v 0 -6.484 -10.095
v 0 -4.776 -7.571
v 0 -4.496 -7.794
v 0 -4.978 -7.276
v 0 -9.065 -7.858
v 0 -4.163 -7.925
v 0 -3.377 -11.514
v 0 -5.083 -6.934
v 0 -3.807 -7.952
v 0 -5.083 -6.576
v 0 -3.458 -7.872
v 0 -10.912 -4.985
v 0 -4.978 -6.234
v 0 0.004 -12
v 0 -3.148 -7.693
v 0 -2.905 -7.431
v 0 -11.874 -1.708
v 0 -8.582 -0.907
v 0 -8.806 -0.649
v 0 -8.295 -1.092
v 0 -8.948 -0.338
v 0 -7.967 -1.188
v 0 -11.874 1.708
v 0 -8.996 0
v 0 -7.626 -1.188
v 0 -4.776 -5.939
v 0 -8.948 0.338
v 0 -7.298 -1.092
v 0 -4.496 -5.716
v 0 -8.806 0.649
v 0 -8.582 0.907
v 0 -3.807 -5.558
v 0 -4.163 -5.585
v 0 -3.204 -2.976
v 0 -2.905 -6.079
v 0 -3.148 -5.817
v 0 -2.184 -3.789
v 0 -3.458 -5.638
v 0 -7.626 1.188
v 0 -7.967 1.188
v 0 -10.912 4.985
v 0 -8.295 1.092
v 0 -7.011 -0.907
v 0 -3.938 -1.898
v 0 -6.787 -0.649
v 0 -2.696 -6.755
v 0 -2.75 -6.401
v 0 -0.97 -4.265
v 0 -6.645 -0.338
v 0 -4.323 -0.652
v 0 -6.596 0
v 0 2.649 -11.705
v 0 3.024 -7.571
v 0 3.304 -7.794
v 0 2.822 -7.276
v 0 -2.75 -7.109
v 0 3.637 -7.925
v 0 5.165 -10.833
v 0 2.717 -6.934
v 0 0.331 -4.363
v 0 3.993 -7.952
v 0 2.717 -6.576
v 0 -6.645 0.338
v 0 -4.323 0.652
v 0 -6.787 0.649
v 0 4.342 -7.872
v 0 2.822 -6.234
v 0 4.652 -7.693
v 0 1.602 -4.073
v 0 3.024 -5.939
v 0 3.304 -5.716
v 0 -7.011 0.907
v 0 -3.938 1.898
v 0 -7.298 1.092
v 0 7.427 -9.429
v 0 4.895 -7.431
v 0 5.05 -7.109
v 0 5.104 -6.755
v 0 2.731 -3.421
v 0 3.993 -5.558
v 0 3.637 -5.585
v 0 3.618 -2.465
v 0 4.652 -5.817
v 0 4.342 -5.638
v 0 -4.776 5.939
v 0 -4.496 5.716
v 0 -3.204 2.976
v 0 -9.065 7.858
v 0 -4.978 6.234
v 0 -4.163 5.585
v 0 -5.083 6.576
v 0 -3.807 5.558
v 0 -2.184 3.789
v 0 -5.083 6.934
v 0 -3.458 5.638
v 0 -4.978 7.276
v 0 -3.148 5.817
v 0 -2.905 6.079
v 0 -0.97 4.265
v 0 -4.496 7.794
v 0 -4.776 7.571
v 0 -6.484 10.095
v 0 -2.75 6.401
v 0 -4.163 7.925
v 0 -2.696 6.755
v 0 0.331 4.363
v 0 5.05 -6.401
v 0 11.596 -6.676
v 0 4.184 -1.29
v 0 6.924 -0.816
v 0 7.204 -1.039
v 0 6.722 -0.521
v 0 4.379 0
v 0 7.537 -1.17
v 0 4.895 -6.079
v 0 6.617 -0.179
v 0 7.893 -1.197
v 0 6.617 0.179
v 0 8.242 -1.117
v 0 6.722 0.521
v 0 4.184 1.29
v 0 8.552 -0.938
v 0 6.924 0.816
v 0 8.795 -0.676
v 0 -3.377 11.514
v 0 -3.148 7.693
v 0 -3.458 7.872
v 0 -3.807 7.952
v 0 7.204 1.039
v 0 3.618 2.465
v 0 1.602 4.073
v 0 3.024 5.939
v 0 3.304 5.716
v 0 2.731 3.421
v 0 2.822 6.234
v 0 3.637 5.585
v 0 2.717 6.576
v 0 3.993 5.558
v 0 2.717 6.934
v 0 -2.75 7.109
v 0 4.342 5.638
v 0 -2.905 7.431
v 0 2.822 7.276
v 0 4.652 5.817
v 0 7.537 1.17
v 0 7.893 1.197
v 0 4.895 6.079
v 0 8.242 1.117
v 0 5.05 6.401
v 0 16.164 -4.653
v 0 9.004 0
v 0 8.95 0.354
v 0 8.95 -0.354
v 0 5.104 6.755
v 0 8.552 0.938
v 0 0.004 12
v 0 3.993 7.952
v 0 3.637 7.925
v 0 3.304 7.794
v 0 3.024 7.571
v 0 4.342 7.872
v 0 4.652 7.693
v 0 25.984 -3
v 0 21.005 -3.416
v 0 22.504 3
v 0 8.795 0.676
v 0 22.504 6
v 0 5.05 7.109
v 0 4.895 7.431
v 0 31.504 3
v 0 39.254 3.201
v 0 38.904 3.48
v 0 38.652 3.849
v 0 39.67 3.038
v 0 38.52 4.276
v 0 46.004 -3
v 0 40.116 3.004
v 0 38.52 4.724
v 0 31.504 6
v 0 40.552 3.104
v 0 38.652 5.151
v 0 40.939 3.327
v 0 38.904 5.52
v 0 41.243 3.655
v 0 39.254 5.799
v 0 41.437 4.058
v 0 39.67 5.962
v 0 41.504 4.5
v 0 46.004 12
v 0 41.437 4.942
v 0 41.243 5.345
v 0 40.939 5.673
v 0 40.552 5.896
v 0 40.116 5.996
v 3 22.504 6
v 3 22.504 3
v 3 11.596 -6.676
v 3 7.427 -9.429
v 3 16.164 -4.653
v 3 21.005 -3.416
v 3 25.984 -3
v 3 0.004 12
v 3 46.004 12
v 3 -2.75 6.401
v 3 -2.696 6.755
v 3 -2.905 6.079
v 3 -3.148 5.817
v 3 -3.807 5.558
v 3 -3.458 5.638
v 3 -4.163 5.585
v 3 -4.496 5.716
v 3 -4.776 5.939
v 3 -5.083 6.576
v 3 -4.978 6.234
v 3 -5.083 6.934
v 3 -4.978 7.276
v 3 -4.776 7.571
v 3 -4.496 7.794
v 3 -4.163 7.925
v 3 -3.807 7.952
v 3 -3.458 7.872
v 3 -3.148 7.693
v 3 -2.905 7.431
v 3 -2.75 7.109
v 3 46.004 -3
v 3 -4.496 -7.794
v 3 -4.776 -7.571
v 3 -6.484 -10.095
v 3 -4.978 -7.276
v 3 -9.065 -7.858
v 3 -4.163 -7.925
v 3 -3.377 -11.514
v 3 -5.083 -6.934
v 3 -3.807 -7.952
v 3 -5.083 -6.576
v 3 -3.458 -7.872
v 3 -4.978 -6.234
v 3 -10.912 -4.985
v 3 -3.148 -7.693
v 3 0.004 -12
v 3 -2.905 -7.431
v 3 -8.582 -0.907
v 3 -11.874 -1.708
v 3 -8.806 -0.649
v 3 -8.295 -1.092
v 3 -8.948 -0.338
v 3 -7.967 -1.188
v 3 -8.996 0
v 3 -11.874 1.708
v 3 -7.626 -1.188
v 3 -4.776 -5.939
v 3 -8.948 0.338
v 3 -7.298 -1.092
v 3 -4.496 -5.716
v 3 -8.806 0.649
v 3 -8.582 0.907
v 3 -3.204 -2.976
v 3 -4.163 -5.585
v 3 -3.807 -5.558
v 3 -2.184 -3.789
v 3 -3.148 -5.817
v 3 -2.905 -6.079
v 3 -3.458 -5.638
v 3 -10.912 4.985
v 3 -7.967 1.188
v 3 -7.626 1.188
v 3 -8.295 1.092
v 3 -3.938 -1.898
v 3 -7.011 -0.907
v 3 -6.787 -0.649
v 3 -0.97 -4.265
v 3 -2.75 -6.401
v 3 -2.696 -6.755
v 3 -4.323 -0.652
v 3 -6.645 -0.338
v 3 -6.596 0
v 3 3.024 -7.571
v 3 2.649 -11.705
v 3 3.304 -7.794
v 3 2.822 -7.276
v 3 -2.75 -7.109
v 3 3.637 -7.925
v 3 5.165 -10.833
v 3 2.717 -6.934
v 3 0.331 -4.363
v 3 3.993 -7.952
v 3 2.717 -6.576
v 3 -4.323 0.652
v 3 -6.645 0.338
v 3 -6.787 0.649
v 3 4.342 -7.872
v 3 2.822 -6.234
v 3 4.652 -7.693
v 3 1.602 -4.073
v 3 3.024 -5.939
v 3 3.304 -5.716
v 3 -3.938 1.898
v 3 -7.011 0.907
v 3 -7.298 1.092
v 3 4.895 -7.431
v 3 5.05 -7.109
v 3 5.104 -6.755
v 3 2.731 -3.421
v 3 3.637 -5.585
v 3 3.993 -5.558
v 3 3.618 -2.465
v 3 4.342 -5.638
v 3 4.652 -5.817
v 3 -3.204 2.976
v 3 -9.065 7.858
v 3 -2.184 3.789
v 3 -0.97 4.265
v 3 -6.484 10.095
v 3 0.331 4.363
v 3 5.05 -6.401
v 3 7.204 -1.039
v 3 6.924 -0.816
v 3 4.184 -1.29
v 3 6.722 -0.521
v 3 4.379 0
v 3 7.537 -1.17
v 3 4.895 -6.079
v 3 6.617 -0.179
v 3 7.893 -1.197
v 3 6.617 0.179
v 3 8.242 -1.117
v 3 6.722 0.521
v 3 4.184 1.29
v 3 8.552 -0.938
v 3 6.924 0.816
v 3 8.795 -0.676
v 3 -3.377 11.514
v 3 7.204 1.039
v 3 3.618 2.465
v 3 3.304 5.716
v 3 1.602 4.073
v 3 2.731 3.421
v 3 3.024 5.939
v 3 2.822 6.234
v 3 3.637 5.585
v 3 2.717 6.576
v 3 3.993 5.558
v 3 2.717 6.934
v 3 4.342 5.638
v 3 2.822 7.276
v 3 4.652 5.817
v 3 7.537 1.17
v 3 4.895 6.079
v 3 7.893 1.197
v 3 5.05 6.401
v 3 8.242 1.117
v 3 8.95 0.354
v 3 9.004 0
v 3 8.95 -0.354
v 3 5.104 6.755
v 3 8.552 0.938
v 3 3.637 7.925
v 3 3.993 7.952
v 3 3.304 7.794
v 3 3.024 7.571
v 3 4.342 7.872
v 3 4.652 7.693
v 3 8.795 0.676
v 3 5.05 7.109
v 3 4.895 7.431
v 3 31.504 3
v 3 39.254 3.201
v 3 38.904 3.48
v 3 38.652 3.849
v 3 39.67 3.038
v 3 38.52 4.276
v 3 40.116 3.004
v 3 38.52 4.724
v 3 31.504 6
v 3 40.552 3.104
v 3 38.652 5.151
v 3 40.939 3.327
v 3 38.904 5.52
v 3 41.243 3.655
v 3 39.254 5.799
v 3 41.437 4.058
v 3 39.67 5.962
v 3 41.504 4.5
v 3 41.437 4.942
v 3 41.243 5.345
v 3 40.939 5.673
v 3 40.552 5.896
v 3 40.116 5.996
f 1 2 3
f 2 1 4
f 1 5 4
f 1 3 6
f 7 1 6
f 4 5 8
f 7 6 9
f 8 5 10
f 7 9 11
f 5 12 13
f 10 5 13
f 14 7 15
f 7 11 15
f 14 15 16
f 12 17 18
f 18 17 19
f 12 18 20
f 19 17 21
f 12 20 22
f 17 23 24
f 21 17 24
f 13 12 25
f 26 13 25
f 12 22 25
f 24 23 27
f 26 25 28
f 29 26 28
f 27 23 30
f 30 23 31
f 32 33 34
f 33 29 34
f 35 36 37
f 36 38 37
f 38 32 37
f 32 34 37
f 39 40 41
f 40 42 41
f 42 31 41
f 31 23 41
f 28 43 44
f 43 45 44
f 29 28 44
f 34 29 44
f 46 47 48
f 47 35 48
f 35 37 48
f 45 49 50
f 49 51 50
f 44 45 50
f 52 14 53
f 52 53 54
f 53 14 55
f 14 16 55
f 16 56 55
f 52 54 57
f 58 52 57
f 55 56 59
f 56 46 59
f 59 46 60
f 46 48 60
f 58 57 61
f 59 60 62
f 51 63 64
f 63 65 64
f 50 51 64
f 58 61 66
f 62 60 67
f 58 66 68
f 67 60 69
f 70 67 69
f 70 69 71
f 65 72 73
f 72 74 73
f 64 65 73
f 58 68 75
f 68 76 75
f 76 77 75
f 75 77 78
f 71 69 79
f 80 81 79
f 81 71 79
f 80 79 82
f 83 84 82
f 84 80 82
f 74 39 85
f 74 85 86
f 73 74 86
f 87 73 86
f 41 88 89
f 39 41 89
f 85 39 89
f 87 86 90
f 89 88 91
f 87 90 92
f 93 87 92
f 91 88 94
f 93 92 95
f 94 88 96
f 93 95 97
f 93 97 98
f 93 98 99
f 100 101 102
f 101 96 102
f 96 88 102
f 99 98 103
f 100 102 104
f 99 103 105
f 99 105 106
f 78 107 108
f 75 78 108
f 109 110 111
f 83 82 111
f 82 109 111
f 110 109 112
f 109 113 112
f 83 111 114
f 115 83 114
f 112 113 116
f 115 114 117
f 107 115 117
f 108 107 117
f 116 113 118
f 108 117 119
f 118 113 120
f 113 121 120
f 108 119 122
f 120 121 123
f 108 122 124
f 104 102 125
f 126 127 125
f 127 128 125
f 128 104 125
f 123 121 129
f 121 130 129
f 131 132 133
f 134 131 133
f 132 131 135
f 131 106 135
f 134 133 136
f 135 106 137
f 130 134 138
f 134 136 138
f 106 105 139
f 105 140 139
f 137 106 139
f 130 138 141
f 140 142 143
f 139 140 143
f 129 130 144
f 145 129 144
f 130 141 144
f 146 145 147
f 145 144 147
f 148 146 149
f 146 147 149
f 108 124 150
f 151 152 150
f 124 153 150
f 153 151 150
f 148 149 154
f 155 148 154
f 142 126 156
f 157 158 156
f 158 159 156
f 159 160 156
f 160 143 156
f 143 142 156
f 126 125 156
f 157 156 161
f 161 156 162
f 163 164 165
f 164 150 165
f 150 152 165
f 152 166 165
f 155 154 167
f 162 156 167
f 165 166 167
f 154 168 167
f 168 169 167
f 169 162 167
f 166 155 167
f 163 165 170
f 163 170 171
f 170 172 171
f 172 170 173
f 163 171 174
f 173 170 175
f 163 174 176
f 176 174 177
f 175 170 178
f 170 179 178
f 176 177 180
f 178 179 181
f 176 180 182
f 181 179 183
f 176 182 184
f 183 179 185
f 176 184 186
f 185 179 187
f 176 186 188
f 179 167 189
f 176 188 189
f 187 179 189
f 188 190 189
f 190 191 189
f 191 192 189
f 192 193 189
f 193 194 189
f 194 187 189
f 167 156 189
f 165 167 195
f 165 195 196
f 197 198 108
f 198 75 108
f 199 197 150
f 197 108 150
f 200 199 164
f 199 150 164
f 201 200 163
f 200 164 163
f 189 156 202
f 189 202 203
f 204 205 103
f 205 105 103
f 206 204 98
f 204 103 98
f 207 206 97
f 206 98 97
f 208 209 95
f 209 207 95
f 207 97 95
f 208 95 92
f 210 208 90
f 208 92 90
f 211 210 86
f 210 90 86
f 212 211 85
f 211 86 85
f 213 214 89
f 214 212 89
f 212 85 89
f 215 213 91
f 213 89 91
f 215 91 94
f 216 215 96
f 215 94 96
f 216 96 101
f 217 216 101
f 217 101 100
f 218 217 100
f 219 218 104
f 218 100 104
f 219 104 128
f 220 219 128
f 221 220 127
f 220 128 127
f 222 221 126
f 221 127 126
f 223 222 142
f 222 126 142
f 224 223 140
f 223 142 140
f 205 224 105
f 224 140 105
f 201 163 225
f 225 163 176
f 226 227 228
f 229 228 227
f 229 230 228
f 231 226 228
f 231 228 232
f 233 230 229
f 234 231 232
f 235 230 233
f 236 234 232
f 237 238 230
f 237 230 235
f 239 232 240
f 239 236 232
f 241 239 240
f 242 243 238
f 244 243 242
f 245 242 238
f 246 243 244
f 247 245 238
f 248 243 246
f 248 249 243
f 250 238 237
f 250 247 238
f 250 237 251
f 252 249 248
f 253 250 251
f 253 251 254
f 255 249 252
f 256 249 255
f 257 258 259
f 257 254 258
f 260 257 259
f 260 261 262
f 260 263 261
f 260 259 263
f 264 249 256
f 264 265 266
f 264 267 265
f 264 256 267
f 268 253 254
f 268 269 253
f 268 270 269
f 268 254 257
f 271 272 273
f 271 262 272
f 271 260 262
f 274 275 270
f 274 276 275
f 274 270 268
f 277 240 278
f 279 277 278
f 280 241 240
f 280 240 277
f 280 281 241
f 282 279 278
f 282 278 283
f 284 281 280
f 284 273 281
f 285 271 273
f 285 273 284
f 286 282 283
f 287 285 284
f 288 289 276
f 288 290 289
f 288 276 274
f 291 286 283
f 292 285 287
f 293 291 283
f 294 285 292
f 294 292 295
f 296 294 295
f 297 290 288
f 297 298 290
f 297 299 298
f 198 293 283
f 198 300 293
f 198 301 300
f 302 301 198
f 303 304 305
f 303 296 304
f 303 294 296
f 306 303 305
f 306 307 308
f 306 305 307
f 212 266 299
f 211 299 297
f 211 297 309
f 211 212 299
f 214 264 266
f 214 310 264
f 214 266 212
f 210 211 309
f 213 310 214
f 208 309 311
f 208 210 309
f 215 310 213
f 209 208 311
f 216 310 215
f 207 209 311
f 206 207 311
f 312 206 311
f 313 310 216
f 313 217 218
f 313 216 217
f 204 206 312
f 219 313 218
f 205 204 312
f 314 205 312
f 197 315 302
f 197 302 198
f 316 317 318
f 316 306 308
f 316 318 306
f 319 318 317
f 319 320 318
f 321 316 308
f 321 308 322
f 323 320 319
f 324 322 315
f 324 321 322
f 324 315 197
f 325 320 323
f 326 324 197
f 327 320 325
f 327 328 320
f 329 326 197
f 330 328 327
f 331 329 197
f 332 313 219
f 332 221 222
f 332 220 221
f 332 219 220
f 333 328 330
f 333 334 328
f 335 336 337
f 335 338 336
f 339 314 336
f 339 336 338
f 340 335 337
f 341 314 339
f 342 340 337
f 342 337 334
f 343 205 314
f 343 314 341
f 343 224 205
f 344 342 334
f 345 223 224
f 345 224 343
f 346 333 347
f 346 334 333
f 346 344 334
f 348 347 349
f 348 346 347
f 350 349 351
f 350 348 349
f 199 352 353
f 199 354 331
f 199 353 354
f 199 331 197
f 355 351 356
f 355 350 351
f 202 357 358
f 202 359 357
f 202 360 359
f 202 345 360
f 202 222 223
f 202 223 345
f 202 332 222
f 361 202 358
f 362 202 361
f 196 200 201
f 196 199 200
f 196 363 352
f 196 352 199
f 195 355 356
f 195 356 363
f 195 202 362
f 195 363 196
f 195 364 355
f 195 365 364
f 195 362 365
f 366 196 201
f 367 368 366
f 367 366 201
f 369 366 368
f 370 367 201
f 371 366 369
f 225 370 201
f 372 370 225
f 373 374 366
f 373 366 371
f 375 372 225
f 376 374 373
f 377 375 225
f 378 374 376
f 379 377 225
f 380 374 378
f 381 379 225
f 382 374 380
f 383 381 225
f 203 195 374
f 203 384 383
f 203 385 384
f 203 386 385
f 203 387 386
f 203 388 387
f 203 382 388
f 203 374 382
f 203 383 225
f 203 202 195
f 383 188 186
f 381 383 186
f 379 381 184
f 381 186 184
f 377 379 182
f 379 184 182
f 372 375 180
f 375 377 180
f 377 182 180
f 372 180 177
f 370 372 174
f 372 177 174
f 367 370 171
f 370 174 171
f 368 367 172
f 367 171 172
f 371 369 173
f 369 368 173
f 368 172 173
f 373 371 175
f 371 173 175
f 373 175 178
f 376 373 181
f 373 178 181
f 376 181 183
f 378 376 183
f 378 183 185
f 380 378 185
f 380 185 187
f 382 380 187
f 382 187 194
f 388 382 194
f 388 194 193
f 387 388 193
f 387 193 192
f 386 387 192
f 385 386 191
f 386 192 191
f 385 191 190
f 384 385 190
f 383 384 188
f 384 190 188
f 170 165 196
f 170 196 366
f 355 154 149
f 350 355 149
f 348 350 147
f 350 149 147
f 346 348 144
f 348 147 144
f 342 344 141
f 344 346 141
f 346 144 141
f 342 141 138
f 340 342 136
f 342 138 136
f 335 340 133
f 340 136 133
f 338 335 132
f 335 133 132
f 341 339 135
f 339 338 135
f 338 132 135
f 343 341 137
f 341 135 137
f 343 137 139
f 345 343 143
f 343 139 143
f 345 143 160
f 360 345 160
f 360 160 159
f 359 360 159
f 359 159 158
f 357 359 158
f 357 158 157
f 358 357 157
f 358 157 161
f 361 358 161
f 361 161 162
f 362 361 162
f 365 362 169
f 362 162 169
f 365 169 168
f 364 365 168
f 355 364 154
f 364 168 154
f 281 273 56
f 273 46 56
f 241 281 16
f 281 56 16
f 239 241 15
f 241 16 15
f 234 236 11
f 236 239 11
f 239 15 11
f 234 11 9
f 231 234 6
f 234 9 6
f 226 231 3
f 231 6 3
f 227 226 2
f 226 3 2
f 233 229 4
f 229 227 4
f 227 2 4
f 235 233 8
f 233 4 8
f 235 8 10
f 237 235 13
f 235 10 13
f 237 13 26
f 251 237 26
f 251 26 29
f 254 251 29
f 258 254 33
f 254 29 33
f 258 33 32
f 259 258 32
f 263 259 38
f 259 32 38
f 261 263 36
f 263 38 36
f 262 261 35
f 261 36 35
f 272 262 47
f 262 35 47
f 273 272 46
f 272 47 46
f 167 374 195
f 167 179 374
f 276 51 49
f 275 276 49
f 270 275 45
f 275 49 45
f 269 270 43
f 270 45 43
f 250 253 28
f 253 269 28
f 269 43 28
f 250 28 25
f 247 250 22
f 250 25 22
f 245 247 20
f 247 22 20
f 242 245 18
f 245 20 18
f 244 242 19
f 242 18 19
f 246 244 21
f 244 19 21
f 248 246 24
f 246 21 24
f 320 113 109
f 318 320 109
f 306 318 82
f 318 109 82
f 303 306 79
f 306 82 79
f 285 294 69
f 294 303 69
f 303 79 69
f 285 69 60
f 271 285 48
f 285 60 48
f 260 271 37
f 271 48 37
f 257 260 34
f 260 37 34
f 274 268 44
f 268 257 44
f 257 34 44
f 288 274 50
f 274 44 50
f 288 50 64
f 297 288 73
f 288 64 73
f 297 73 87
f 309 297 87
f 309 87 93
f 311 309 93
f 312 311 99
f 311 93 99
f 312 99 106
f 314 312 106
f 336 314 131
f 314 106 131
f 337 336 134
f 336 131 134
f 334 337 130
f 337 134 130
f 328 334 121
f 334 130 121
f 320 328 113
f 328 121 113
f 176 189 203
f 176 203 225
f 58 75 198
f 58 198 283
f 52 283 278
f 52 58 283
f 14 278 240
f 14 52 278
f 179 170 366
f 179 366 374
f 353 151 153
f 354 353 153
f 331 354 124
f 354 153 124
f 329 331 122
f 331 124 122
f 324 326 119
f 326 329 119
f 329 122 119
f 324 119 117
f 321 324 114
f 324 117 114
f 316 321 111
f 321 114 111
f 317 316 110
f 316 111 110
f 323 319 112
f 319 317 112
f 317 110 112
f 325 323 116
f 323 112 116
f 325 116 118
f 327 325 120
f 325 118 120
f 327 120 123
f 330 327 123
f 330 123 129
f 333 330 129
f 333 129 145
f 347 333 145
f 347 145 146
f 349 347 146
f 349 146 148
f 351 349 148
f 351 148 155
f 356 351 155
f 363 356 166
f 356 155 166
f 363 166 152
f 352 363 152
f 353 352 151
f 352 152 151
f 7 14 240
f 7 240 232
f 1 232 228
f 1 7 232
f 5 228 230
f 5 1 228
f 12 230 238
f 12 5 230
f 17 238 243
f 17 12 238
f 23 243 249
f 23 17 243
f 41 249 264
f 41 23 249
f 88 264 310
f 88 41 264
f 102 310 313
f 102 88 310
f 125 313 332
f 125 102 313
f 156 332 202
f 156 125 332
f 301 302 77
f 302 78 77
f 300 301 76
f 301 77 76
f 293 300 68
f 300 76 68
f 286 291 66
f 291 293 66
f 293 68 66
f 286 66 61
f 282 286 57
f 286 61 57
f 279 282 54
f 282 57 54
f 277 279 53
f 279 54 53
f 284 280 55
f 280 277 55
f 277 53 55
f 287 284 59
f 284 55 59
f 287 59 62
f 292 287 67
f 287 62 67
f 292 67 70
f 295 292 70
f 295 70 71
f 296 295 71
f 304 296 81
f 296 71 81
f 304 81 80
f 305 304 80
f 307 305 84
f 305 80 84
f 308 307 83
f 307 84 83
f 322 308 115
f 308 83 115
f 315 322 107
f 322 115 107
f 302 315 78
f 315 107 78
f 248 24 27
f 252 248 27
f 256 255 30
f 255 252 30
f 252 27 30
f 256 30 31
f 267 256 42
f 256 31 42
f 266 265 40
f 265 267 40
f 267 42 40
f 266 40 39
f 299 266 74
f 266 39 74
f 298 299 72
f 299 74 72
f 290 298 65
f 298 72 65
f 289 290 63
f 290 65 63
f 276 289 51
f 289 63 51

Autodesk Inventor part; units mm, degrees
ref_plane "YZ Plane" through (0, 0, 0) normal (1, 0, 0) x (0, 1, 0)
ref_plane "XZ Plane" through (0, 0, 0) normal (0, 1, 0) x (-1, 0, 0)
ref_plane "XY Plane" through (0, 0, 0) normal (0, 0, 1) x (1, 0, 0)
sketch "Sketch1" plane through (0, 0, 0) normal (1, 0, 0) x (0, 1, 0)
  arc A0 (0.0036, 12) -> (0.0036, -12) centre (0.0036, 0) ccw
  circle A1 centre (0.0036, 0) radius 4.375
  circle A2 centre (0.0036, 0) radius 9 construction
  line L0 (-11.9964, 0) -> (0.0036, 0) construction
  line L1 (-8.9964, 0) -> (-7.7964, 0)
  circle A3 centre (-7.7964, 0) radius 1.2
  circle A4 centre (-3.8964, -6.755) radius 1.2
  circle A5 centre (3.9036, -6.755) radius 1.2
  circle A6 centre (7.8036, 0) radius 1.2
  circle A7 centre (3.9036, 6.755) radius 1.2
  circle A8 centre (-3.8964, 6.755) radius 1.2
  line L2 (-11.9964, 0) -> (33.0036, 0) construction
  line L3 (-11.9964, 37.6945) -> (46.0036, 37.6945) construction
  line L4 (0.0036, 12) -> (46.0036, 12)
  line L5 (46.0036, 12) -> (46.0036, -3)
  arc A9 (0.0036, -12) -> (7.4266, -9.4286) centre (0.0036, 0) ccw
  arc A10 (25.9843, -3) -> (7.4266, -9.4286) centre (25.9843, -33) ccw
  line L6 (25.9843, -3) -> (46.0036, -3)
  circle A11 centre (40.0036, 4.5) radius 1.5
  line L7 (31.5036, 6) -> (22.5036, 6)
  line L8 (22.5036, 6) -> (22.5036, 3)
  line L9 (22.5036, 3) -> (31.5036, 3)
  line L10 (31.5036, 3) -> (31.5036, 6)
  point P0 (1.5, 26.1095)
  point P1 (22.5, 26.1095)
  point P2 (-4.4964, -7.7942)
  point P3 (4.5036, -7.7942)
  point P4 (9.0036, 0)
  point P5 (4.5036, 7.7942)
  point P6 (-4.4964, 7.7942)
  point P7 (11.6225, -3)
  dimension "d4" = 18
  dimension "d2" = 24
  dimension "d3" = 8.75
  dimension "d5" = 1.2
  dimension "d7" = 360
  dimension "d8" = 45
  dimension "d12" = 12
  dimension "d15" = 58
  dimension "d16" = 15
  dimension "d18" = 30
  dimension "d22" = 3
  dimension "d23" = 6
  dimension "d28" = 7.5
  dimension "d29" = 15
  dimension "d31" = 9
  dimension "d32" = 3
  dimension "d33" = 12
extrude "Extrusion1" add sketch "Sketch1" along normal blind 3
properties part number "Brazo3"
